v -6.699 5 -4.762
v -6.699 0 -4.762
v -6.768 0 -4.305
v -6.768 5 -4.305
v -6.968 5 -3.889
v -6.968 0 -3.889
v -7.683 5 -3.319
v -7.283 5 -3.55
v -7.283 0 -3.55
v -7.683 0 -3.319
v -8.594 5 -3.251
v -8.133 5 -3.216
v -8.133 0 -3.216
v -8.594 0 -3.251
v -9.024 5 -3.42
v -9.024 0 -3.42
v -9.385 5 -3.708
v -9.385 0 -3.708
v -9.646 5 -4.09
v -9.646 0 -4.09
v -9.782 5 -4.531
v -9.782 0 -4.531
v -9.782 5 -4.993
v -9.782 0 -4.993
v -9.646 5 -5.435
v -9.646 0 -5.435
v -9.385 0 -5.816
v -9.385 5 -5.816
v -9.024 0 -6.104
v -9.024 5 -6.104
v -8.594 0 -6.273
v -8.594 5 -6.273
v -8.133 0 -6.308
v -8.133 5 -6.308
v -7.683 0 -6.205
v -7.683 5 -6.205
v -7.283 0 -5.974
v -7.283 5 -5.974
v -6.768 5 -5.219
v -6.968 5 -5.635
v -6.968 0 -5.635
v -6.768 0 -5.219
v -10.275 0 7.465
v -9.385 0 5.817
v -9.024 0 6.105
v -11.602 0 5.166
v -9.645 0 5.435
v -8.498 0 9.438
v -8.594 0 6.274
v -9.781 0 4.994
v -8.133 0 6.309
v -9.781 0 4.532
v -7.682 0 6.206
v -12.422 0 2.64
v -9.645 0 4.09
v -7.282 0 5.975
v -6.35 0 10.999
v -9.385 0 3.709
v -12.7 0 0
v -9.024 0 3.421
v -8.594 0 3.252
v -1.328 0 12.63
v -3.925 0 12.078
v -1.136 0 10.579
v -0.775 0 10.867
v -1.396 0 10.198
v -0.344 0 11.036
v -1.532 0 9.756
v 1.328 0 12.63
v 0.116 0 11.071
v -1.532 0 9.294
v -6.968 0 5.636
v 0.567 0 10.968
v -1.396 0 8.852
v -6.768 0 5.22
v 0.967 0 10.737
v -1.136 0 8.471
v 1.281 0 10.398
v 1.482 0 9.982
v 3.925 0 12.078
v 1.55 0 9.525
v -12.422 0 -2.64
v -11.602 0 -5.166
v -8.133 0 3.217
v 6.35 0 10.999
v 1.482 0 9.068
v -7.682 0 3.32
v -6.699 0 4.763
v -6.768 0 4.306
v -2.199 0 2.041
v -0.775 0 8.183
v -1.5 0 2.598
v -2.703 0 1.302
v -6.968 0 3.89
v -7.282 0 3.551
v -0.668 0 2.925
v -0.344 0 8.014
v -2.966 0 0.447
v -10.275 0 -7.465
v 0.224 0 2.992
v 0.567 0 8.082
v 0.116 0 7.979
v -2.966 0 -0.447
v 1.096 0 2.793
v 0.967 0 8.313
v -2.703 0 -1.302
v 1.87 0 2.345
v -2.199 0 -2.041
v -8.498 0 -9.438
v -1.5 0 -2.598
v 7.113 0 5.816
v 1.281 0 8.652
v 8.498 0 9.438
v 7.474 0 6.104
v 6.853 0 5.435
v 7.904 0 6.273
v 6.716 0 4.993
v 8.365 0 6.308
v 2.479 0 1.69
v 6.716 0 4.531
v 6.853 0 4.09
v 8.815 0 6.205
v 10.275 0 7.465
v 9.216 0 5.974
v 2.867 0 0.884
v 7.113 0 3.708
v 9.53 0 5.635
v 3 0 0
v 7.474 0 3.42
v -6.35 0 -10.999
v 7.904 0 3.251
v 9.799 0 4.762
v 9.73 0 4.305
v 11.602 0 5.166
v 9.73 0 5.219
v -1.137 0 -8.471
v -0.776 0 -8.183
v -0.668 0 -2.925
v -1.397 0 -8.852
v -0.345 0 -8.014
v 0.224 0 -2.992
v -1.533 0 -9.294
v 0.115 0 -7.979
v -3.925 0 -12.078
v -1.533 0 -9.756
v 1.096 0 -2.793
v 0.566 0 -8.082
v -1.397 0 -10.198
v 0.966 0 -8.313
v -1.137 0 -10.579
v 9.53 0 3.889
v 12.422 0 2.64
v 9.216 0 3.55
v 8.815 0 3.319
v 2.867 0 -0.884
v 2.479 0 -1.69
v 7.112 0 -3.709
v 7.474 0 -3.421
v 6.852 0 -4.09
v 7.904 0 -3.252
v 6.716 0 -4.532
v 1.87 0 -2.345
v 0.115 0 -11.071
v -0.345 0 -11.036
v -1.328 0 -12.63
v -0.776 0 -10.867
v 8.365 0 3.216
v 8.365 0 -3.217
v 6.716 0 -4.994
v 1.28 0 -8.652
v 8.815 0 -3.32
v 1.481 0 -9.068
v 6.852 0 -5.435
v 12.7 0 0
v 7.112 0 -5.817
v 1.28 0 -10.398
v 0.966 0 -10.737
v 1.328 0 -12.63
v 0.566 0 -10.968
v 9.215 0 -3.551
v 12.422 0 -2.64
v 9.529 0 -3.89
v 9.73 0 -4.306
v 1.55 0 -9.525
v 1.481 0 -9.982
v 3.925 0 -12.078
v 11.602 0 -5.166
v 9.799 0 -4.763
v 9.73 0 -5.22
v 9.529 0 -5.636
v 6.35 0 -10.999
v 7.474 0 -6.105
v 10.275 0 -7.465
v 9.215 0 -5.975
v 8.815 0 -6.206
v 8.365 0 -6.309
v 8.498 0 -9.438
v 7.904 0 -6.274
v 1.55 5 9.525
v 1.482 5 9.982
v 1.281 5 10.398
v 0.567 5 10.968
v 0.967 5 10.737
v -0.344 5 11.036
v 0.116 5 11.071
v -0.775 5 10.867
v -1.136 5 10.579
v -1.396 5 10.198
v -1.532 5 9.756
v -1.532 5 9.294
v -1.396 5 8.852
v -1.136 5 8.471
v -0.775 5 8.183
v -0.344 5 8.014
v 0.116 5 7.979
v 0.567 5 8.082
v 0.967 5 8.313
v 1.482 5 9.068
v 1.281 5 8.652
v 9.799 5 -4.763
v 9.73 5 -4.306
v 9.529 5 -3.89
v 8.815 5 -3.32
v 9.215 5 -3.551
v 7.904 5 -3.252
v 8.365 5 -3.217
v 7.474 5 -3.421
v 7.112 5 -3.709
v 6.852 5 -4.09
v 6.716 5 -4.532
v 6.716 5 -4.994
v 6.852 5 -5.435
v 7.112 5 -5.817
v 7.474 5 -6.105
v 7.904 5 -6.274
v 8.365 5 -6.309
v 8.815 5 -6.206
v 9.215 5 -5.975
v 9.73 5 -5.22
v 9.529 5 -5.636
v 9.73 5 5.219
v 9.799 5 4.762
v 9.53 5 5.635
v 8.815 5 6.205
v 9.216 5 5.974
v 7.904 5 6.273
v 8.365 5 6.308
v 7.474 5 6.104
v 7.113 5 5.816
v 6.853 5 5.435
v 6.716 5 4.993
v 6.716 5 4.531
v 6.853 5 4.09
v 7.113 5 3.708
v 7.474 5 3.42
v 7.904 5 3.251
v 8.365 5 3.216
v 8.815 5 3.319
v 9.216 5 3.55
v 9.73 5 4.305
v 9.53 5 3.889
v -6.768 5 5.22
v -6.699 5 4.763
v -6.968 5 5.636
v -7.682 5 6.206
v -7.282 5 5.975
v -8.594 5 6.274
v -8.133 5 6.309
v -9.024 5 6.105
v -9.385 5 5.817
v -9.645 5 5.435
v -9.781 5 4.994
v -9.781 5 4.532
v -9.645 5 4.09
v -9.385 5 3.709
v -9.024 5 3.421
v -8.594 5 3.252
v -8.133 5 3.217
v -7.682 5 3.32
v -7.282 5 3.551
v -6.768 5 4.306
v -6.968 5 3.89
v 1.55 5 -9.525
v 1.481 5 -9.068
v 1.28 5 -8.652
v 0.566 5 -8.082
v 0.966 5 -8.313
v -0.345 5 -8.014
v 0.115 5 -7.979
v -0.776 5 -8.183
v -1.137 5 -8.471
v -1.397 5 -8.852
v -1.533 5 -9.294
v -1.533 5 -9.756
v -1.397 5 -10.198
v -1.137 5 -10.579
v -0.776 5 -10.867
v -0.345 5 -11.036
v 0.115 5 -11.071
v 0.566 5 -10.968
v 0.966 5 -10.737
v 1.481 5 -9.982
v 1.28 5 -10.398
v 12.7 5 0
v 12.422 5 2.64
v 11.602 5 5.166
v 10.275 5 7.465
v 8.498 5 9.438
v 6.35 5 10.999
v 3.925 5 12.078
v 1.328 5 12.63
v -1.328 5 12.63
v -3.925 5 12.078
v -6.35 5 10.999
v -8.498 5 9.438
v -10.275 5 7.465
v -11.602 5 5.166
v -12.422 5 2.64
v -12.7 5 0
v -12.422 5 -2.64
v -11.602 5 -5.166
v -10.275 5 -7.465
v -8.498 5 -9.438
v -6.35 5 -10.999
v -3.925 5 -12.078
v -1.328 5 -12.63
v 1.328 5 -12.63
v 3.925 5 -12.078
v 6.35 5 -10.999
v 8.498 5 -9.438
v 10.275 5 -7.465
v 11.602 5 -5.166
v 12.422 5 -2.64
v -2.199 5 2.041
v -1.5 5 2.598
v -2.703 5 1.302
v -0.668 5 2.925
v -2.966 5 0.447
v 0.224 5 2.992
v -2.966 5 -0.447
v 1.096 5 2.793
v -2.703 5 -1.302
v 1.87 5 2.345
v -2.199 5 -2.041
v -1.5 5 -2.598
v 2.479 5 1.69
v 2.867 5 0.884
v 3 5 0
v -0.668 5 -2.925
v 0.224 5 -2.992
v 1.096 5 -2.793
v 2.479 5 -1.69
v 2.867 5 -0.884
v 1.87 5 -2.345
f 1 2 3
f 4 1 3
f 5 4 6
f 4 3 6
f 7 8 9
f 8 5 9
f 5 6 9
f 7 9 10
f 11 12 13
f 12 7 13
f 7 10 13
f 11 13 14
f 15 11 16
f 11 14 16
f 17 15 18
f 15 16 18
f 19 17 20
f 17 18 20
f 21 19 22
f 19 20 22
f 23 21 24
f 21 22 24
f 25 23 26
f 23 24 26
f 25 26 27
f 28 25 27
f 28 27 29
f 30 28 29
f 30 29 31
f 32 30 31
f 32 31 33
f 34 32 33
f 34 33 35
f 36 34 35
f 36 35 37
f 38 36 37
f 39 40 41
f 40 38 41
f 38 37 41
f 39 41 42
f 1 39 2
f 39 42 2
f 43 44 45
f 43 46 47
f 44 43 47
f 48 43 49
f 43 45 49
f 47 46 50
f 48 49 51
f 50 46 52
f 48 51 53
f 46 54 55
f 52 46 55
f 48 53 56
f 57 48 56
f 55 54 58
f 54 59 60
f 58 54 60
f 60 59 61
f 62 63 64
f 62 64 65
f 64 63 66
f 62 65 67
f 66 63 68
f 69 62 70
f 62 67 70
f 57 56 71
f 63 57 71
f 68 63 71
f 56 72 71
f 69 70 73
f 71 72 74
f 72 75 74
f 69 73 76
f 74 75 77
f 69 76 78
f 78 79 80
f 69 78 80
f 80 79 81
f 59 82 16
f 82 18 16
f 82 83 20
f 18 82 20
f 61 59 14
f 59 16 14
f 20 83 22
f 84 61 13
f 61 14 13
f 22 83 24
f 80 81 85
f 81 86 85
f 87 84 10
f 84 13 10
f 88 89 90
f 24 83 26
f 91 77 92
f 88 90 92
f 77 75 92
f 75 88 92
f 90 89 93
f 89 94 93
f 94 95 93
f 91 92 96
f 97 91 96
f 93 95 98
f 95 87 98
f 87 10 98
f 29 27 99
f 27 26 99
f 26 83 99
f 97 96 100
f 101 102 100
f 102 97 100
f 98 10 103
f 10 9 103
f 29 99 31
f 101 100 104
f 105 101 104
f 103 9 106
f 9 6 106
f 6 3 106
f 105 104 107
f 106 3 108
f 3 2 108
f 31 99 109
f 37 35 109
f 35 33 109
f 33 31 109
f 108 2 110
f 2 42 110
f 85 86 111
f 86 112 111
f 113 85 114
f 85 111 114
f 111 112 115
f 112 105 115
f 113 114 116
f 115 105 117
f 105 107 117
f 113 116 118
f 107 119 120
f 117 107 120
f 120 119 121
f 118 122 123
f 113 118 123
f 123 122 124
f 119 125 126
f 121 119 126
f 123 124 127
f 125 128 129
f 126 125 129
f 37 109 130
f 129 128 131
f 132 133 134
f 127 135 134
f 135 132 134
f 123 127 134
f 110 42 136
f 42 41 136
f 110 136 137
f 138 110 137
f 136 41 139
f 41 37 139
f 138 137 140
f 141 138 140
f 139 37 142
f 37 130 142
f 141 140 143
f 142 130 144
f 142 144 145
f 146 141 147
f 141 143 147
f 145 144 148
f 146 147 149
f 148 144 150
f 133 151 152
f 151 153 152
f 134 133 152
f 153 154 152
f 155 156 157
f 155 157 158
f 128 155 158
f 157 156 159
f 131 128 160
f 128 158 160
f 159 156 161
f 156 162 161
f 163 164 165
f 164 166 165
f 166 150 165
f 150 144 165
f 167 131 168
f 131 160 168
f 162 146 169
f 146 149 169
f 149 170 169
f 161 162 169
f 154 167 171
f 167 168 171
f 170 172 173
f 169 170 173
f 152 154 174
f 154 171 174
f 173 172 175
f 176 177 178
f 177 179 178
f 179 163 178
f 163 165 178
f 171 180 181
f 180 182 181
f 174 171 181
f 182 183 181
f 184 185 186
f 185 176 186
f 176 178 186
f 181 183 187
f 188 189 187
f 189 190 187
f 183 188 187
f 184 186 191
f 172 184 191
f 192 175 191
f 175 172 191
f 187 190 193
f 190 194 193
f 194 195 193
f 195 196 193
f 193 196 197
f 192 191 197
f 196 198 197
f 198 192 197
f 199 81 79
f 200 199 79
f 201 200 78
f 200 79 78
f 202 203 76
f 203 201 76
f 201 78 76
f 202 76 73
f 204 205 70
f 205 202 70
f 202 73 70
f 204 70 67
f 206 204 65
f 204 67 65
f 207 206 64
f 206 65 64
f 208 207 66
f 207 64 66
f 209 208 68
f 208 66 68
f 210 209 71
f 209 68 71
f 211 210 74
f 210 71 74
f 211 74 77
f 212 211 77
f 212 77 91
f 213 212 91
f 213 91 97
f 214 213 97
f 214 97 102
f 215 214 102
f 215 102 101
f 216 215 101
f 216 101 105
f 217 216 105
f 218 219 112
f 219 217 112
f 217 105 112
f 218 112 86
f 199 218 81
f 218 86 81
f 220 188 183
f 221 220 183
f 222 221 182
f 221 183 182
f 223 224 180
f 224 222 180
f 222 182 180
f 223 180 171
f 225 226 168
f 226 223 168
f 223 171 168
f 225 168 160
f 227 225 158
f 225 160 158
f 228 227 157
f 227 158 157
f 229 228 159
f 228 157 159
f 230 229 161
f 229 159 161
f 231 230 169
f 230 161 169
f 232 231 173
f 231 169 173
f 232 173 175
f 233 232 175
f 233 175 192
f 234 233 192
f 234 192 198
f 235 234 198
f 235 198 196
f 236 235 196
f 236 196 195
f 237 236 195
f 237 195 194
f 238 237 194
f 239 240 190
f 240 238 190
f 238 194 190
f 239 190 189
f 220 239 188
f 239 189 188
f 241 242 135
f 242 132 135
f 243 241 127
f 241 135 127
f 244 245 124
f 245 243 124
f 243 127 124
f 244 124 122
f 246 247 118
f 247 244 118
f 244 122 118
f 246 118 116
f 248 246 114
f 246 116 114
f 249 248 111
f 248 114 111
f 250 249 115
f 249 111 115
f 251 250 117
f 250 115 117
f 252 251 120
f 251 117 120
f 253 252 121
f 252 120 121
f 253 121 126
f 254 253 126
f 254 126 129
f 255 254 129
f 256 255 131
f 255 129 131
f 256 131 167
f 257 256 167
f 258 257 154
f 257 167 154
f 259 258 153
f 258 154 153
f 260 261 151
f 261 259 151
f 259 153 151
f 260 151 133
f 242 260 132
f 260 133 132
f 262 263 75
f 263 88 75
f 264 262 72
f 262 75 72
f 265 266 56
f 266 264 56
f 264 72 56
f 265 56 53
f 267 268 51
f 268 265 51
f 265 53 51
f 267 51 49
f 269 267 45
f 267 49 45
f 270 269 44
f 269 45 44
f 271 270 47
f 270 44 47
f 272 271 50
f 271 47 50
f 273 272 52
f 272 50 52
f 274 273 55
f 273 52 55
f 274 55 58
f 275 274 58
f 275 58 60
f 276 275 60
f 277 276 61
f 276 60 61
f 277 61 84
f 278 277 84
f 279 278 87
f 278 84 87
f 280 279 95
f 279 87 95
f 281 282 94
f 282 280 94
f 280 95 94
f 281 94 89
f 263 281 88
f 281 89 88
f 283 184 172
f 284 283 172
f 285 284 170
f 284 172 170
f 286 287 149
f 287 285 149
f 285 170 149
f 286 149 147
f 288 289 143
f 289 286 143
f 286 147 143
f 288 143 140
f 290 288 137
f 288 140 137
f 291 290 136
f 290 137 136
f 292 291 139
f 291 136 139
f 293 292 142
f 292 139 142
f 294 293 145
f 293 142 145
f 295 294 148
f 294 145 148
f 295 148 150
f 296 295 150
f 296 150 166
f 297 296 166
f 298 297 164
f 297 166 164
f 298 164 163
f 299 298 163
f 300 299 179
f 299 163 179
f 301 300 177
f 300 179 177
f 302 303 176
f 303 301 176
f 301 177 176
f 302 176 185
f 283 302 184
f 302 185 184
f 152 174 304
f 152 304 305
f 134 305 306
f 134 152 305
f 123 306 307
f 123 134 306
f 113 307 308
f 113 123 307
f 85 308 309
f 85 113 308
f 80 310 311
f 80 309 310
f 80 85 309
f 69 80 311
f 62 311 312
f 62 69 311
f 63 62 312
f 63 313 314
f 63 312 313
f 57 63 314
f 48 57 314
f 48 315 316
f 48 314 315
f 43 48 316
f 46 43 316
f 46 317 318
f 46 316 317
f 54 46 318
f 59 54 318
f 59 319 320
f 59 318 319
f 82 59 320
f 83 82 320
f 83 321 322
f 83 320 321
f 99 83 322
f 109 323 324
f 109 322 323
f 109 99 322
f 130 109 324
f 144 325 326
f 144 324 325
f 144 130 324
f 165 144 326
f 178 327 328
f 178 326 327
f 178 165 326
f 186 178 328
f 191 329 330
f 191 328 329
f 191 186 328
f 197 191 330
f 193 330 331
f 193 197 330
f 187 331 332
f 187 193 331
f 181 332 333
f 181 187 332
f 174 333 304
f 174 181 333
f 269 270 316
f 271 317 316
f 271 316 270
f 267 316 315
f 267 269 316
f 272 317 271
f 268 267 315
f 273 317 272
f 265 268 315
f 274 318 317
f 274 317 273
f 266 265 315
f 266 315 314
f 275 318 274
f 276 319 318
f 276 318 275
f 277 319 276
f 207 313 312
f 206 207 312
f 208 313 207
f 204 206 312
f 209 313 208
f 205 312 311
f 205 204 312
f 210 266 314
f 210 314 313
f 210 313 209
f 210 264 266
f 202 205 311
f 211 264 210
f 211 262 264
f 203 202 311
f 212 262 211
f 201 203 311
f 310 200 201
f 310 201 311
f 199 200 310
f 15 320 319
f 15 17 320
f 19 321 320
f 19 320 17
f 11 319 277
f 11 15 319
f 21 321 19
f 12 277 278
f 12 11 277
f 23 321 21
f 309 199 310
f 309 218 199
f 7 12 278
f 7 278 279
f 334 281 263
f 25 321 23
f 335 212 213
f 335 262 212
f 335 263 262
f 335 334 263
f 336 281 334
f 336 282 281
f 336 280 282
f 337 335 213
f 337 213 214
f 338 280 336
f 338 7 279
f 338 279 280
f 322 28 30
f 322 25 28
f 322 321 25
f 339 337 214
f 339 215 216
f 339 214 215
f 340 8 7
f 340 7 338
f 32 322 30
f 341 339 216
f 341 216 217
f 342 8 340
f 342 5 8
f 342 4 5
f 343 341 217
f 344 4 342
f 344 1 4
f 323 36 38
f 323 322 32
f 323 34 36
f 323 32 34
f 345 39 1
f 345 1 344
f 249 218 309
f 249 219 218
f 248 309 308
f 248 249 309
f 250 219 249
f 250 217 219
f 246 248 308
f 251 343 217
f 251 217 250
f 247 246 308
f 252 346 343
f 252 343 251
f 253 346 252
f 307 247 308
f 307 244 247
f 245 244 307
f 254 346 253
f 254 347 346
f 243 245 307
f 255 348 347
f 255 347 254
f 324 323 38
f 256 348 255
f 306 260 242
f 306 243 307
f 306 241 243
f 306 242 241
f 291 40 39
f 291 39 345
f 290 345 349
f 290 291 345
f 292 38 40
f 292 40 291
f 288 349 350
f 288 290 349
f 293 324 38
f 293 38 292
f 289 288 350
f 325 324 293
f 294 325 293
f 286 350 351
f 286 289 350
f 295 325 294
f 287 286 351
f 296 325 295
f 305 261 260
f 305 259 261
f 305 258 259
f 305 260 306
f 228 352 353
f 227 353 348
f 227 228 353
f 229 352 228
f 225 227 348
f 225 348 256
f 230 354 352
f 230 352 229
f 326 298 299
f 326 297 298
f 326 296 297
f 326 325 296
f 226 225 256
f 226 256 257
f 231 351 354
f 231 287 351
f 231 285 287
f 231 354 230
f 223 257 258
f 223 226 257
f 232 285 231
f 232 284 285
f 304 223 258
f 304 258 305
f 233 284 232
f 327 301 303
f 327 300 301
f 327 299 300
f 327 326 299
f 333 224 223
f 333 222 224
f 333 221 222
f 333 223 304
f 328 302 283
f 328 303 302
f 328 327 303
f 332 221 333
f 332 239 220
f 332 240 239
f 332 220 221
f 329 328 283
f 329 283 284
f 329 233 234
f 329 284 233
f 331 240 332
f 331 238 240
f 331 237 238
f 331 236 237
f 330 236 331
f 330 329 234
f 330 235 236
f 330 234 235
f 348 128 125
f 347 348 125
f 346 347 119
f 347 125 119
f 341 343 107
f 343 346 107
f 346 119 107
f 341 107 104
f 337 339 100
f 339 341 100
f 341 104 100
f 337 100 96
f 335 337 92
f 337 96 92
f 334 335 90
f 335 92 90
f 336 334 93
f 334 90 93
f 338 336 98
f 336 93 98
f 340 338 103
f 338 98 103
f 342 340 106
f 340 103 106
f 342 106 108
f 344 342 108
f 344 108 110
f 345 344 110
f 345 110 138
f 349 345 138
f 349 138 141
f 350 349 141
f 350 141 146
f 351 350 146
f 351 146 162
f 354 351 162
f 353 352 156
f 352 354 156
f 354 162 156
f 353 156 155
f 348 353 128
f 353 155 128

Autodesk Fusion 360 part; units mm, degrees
sketch "Sketch1" plane through (0, 0, 0) normal (0, 1, 0) x (1, 0, 0)
  circle A0 centre (0, 0) radius 12.7
  circle A1 centre (0, 0) radius 9.525 construction
  circle A2 centre (-0.0005, 9.525) radius 1.55
  circle A3 centre (-8.2491, 4.7621) radius 1.55
  circle A4 centre (-8.2487, -4.7629) radius 1.55
  circle A5 centre (0.0005, -9.525) radius 1.55
  circle A6 centre (8.2491, -4.7621) radius 1.55
  circle A7 centre (8.2487, 4.7629) radius 1.55
  circle A8 centre (0, 0) radius 3
  dimension "d1" = 25.4
  dimension "d2" = 19.05
  dimension "d3" = 3.1
  dimension "d5" = 360
  dimension "d6" = 6
extrude "Extrude1" add sketch "Sketch1" along normal blind 5
